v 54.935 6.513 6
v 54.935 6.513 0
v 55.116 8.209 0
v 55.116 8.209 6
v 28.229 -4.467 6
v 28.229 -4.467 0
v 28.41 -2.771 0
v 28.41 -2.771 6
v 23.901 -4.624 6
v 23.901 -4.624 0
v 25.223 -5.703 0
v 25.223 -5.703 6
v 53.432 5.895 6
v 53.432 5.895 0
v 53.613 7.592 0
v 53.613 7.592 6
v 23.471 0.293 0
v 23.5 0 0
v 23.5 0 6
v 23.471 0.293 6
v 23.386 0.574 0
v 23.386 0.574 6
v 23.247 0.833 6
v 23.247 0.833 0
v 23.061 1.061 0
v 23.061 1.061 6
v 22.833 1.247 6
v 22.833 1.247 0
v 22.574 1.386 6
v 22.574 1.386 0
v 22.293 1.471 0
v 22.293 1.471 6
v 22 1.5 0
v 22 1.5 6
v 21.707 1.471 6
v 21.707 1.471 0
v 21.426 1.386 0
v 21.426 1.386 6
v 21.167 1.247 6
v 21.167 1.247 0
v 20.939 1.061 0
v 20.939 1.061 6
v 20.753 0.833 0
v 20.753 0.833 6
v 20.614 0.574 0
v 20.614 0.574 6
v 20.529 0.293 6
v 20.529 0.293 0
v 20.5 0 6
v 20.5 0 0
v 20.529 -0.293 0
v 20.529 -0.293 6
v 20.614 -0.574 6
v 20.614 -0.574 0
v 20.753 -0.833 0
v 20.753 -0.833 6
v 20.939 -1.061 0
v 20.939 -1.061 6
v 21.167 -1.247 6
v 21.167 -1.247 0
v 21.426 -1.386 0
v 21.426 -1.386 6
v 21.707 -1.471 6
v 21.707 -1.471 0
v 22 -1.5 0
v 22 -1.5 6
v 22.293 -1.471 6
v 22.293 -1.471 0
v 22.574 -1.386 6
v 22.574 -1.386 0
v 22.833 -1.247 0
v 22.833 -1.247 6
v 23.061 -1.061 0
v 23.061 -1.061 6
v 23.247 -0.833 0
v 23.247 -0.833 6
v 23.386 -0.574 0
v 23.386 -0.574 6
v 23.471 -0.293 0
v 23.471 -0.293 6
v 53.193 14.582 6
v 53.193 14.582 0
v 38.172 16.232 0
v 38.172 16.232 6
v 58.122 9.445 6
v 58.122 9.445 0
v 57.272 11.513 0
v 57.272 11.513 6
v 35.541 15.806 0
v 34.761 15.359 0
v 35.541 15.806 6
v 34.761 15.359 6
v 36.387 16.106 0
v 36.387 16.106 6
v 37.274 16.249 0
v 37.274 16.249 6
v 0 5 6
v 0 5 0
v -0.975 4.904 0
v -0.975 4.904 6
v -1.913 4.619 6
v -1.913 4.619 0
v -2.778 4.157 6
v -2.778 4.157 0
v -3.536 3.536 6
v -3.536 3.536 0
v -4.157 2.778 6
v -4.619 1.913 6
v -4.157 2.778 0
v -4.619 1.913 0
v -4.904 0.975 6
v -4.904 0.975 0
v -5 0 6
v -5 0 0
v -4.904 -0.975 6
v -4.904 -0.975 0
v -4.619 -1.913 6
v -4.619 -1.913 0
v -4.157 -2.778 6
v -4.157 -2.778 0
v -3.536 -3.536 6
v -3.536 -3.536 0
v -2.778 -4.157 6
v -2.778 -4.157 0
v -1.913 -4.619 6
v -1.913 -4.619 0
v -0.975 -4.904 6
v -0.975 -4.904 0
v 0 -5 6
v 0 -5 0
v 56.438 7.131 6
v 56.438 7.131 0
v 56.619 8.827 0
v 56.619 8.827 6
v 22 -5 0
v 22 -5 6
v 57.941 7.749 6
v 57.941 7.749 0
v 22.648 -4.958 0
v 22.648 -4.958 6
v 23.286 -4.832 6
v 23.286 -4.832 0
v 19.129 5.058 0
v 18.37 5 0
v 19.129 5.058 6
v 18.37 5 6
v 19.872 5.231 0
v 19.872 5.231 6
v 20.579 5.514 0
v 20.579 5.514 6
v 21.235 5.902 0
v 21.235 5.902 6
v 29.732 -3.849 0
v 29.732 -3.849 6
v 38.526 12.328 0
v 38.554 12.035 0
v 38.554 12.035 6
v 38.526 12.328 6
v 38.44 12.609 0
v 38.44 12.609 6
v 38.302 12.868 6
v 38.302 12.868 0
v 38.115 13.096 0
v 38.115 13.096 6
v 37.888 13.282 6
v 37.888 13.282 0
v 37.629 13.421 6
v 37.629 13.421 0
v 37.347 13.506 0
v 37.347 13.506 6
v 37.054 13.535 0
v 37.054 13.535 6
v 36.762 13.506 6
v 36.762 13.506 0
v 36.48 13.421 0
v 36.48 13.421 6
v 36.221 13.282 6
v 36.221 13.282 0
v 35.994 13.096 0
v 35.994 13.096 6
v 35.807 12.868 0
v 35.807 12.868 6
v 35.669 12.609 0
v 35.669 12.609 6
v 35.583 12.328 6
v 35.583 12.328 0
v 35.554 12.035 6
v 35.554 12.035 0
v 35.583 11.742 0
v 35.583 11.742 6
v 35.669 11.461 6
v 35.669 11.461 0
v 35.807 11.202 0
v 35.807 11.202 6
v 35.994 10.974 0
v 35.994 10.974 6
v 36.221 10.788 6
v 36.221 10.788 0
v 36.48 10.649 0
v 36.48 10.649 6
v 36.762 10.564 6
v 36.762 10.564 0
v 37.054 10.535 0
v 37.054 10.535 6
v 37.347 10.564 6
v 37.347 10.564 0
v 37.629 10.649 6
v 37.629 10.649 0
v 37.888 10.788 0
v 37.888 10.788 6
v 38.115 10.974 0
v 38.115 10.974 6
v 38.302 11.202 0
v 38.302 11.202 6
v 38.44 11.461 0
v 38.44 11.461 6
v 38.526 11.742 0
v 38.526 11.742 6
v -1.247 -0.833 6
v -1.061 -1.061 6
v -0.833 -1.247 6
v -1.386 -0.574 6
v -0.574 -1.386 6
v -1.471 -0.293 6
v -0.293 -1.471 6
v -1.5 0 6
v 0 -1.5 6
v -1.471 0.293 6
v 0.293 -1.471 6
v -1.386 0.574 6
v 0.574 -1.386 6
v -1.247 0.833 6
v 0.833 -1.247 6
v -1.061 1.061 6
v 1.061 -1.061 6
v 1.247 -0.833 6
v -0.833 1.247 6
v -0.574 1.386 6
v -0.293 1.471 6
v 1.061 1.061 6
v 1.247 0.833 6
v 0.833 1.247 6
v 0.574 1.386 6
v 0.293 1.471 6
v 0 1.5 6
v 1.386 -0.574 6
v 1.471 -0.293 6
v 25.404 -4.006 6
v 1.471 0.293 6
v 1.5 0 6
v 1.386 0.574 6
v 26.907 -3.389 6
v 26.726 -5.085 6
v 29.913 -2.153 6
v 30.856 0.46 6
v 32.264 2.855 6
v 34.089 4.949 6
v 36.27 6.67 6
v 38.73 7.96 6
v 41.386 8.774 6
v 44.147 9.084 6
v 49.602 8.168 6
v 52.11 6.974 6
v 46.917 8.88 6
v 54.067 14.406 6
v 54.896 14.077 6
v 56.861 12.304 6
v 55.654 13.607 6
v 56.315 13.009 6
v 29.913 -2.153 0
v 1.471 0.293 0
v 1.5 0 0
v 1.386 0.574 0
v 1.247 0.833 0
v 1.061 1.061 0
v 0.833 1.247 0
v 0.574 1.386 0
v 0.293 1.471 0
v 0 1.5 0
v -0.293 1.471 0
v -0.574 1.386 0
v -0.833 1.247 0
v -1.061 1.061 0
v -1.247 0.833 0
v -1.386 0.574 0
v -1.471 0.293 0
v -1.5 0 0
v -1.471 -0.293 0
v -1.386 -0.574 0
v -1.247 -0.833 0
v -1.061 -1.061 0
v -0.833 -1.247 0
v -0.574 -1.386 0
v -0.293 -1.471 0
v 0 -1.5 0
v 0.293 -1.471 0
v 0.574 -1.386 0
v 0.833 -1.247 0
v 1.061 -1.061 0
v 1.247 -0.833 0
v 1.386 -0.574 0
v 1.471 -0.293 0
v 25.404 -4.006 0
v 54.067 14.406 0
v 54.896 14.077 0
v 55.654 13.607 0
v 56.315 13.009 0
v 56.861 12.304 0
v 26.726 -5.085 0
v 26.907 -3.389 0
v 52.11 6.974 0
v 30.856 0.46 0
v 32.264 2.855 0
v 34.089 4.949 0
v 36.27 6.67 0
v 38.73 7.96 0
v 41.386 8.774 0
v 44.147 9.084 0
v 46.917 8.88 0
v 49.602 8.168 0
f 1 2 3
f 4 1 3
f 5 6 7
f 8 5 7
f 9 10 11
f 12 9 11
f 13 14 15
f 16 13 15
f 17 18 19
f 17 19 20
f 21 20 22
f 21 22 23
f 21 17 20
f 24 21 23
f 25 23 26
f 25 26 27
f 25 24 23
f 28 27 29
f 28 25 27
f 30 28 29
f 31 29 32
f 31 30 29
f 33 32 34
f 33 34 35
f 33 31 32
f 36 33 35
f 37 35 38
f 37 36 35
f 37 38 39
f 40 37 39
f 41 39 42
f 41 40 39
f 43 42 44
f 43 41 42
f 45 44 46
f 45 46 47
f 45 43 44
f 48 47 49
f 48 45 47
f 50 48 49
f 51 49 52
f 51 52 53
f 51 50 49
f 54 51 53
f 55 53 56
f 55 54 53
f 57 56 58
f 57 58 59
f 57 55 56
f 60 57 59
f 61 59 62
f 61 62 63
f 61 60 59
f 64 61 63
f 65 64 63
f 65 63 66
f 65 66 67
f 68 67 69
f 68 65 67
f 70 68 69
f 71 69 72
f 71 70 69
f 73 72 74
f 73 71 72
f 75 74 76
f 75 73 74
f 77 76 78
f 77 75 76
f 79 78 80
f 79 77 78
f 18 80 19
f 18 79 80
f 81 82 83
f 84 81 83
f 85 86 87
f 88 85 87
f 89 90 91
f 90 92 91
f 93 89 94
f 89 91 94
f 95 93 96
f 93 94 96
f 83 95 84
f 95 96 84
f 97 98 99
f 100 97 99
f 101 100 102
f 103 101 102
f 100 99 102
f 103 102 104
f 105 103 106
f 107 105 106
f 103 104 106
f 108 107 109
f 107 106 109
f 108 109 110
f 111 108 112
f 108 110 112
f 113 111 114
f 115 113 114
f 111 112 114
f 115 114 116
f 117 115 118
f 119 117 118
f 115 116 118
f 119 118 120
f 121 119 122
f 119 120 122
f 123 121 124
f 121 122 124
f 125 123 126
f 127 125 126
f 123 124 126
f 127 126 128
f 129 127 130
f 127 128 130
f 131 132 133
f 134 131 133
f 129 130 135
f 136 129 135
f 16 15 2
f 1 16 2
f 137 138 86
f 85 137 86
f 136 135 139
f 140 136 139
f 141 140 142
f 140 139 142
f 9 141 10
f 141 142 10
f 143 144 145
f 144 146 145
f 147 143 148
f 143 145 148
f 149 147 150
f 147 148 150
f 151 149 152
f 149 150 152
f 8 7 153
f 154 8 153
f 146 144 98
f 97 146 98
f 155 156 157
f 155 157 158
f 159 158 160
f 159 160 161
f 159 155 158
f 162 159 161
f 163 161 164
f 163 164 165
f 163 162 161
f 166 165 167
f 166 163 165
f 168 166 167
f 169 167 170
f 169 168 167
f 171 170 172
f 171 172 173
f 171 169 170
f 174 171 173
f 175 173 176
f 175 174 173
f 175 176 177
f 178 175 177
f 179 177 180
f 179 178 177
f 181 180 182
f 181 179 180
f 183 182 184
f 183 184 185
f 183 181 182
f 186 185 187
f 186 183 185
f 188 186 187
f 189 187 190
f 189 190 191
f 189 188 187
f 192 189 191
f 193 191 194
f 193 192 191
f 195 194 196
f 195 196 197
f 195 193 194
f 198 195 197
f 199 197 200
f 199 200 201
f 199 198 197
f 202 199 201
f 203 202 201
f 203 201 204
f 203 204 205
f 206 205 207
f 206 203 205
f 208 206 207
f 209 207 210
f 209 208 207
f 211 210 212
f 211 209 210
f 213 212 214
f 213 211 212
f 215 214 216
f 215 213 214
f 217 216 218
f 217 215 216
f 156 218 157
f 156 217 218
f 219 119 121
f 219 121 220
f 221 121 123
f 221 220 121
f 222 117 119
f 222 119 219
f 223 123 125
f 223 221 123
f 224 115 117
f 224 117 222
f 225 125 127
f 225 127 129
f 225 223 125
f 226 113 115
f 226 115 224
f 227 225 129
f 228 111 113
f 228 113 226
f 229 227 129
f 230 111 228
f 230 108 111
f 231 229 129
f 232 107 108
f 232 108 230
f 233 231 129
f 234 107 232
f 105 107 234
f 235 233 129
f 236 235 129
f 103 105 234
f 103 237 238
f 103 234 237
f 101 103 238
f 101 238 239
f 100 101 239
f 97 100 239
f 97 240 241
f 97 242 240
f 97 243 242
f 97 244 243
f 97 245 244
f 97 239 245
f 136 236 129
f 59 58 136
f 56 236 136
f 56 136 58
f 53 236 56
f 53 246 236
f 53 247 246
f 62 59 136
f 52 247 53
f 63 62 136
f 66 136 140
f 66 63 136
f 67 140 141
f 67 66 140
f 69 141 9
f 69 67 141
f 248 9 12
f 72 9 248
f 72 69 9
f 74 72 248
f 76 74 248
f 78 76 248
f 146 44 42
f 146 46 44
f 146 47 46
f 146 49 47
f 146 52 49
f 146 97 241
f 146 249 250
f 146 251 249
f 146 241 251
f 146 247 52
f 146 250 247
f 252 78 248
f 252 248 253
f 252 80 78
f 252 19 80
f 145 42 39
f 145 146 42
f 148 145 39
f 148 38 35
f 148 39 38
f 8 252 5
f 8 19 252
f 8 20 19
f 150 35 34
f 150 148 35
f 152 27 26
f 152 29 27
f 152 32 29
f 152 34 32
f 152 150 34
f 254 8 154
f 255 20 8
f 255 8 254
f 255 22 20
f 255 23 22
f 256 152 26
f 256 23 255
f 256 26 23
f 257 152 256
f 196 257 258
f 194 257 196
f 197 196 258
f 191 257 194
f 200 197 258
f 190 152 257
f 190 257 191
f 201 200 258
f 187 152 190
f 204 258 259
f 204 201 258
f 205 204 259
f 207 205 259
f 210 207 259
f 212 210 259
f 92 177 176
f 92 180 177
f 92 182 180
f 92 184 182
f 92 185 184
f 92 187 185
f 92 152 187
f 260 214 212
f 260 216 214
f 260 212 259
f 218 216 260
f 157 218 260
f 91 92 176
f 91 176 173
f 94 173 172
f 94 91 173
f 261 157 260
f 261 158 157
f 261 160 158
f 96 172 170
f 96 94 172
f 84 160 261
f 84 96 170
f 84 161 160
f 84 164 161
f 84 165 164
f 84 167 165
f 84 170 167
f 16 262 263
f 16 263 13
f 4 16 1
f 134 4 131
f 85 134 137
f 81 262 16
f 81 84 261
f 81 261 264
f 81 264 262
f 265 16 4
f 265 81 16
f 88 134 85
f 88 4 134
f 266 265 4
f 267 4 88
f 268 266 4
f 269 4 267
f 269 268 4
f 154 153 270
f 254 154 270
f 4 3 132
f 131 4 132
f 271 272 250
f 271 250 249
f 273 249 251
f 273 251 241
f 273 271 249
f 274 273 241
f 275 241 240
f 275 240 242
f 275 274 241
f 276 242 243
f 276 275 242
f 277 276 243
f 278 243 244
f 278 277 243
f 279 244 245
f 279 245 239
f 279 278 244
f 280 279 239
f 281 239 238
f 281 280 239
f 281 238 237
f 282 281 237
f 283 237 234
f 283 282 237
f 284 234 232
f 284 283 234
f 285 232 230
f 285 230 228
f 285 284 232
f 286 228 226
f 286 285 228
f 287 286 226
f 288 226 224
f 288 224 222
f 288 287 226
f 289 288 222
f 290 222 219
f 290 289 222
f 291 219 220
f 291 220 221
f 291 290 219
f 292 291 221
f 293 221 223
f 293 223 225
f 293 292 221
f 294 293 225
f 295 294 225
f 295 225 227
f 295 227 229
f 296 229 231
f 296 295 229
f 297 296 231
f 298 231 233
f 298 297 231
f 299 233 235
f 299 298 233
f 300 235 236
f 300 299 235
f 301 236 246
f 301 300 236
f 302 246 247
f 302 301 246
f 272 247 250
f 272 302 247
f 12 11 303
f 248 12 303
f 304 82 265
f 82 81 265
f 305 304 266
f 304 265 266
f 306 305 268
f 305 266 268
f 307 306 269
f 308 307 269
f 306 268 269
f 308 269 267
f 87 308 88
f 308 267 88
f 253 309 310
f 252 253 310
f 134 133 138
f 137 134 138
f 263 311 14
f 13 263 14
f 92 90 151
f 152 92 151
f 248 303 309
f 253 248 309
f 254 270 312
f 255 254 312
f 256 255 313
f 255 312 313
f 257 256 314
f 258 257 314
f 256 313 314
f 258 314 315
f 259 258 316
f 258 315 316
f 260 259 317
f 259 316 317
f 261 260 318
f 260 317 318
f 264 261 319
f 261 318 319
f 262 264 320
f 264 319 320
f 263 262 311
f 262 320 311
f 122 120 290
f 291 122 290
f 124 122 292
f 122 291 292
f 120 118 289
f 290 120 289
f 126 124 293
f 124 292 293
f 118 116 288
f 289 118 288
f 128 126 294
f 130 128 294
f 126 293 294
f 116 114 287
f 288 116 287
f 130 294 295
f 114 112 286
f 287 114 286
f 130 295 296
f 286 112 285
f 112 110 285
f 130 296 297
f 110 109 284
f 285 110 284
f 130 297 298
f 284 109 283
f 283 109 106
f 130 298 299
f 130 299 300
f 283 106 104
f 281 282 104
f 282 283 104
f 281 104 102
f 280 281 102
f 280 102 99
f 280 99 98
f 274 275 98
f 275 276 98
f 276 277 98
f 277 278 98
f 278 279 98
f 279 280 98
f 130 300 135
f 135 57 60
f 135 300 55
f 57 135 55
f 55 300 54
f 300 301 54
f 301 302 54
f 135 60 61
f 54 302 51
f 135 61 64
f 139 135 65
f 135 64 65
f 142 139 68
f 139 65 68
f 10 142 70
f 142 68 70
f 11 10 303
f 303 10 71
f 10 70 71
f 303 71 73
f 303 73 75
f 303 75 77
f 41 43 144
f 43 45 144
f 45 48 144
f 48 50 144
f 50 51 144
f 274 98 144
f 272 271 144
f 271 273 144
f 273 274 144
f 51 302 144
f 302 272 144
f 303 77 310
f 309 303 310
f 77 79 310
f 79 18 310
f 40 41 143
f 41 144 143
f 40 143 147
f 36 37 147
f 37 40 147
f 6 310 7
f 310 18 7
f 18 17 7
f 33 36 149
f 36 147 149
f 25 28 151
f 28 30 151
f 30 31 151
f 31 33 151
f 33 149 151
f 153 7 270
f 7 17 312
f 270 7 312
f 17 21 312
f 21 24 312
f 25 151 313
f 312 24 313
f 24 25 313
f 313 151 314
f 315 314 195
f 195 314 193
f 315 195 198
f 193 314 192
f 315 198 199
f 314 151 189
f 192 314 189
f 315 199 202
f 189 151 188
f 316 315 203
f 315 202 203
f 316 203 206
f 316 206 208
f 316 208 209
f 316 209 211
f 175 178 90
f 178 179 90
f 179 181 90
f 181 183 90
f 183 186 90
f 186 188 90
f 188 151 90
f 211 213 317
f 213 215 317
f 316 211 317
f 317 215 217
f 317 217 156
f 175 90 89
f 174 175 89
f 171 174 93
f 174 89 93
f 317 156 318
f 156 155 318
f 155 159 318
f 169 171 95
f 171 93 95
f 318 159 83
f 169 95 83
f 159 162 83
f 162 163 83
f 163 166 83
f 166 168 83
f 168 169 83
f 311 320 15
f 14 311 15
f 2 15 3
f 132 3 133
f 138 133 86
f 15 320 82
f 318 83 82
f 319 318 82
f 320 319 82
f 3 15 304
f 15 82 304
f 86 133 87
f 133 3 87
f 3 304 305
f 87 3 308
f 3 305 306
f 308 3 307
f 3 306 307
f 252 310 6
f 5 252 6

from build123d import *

# Parameters (mm, degrees)
SKETCH1_R           = 1.5
BOSS_EXTRUDE1_DEPTH = 6
FILLET2_R           = 5


with BuildPart() as part:
    # Sketch1 → Boss-Extrude1 (new body)
    with BuildSketch(Plane.XY):
        with BuildLine():
            Line((19.944251464, 5), (0, 5))
            ThreePointArc((0, 5), (-5, 0), (0, -5))
            Line((0, -5), (22, -5))
            ThreePointArc((22, -5), (22.969031552, -4.905199063), (23.901317064, -4.624391141))
            Line((23.901317064, -4.624391141), (25.223175743, -5.70274446))
            Line((25.223175743, -5.70274446), (25.404244184, -4.006463095))
            Line((25.404244184, -4.006463095), (26.726102864, -5.084816415))
            Line((26.726102864, -5.084816415), (26.907171305, -3.388535049))
            Line((26.907171305, -3.388535049), (28.229029985, -4.466888369))
            Line((28.229029985, -4.466888369), (28.410098426, -2.770607004))
            Line((28.410098426, -2.770607004), (29.731957105, -3.848960323))
            Line((29.731957105, -3.848960323), (29.913025547, -2.152678958))
            ThreePointArc((29.913025547, -2.152678958), (38.729983808, 7.959751364), (52.110103023, 6.973642948))
            Line((52.110103023, 6.973642948), (53.431961702, 5.895289628))
            Line((53.431961702, 5.895289628), (53.613030144, 7.591570993))
            Line((53.613030144, 7.591570993), (54.934888823, 6.513217674))
            Line((54.934888823, 6.513217674), (55.115957264, 8.209499039))
            Line((55.115957264, 8.209499039), (56.437815944, 7.13114572))
            Line((56.437815944, 7.13114572), (56.618884385, 8.827427085))
            Line((56.618884385, 8.827427085), (57.940743065, 7.749073765))
            Line((57.940743065, 7.749073765), (58.121811506, 9.44535513))
            Line((58.121811506, 9.44535513), (56.143278706, 14.257550701))
            Line((56.143278706, 14.257550701), (36.302637348, 16.436961709))
            Line((36.302637348, 16.436961709), (19.944251464, 5))
        make_face()
        Circle(SKETCH1_R, mode=Mode.SUBTRACT)
        with Locations((22, 0)):
            Circle(SKETCH1_R, mode=Mode.SUBTRACT)
        with Locations((37.054498685, 12.034873136)):
            Circle(SKETCH1_R, mode=Mode.SUBTRACT)
    extrude(amount=BOSS_EXTRUDE1_DEPTH)

    # Fillet2
    fillet2_edges = [part.edges().sort_by_distance(p)[0] for p in [
        (19.944251464, 5, 3),
        (36.302637348, 16.436961709, 3),
        (56.143278706, 14.257550701, 3),
    ]]
    fillet(fillet2_edges, radius=FILLET2_R)


solid = part.part
